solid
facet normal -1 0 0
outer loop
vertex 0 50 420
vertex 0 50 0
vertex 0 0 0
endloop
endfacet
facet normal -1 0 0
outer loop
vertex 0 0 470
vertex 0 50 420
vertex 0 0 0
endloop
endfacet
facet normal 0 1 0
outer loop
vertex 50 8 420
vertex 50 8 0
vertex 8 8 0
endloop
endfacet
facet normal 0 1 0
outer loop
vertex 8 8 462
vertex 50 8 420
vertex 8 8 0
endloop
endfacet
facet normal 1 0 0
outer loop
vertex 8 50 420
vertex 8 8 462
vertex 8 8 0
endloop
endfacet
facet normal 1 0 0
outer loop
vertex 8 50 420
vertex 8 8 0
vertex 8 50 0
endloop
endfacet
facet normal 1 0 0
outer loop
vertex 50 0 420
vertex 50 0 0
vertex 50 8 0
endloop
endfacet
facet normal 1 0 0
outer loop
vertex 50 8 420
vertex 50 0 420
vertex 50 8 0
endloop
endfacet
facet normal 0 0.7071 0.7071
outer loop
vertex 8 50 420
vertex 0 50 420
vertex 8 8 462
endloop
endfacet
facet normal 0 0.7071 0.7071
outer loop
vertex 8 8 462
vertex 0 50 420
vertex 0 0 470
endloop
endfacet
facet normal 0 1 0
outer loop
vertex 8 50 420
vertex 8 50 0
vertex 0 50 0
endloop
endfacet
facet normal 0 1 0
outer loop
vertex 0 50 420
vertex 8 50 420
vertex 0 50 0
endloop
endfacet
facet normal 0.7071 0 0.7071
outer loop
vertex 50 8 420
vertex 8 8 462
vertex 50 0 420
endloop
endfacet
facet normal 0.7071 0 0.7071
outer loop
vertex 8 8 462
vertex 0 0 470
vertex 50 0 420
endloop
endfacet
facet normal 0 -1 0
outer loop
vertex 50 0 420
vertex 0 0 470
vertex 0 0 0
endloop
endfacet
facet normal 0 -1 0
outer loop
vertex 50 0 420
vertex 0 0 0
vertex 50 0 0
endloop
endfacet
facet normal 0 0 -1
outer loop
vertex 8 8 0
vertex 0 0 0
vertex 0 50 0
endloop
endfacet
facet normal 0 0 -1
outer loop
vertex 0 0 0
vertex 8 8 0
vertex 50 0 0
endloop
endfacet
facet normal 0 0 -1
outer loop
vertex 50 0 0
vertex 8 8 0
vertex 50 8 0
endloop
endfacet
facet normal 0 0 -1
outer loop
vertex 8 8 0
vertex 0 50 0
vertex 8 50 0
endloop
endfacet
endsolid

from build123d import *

# Parameters (mm, degrees)
F1_DEPTH = 470
F3_DEPTH = 8
F5_DEPTH = 8


with BuildPart() as f1:
    # F0 (on Top) → F1 (new body)
    with BuildSketch(Plane.XY):
        Polygon((0, 50), (0, 0), (50, 0), (50, 8), (8, 8), (8, 50), align=None)
    extrude(amount=F1_DEPTH)

    # F2 (on face) → F3 (cut, through all)
    with BuildSketch(Plane.XZ):
        Polygon((50, 470), (0, 470), (50, 420), align=None)
    extrude(amount=-F3_DEPTH, mode=Mode.SUBTRACT)

    # F4 (on face) → F5 (cut, through all)
    with BuildSketch(Plane(origin=(0, 0, 0), x_dir=(0, -1, 0), z_dir=(-1, 0, 0))):
        Polygon((-50, 420), (0, 470), (-8, 470), (-50, 470), align=None)
    extrude(amount=-F5_DEPTH, mode=Mode.SUBTRACT)


solid = f1.part
